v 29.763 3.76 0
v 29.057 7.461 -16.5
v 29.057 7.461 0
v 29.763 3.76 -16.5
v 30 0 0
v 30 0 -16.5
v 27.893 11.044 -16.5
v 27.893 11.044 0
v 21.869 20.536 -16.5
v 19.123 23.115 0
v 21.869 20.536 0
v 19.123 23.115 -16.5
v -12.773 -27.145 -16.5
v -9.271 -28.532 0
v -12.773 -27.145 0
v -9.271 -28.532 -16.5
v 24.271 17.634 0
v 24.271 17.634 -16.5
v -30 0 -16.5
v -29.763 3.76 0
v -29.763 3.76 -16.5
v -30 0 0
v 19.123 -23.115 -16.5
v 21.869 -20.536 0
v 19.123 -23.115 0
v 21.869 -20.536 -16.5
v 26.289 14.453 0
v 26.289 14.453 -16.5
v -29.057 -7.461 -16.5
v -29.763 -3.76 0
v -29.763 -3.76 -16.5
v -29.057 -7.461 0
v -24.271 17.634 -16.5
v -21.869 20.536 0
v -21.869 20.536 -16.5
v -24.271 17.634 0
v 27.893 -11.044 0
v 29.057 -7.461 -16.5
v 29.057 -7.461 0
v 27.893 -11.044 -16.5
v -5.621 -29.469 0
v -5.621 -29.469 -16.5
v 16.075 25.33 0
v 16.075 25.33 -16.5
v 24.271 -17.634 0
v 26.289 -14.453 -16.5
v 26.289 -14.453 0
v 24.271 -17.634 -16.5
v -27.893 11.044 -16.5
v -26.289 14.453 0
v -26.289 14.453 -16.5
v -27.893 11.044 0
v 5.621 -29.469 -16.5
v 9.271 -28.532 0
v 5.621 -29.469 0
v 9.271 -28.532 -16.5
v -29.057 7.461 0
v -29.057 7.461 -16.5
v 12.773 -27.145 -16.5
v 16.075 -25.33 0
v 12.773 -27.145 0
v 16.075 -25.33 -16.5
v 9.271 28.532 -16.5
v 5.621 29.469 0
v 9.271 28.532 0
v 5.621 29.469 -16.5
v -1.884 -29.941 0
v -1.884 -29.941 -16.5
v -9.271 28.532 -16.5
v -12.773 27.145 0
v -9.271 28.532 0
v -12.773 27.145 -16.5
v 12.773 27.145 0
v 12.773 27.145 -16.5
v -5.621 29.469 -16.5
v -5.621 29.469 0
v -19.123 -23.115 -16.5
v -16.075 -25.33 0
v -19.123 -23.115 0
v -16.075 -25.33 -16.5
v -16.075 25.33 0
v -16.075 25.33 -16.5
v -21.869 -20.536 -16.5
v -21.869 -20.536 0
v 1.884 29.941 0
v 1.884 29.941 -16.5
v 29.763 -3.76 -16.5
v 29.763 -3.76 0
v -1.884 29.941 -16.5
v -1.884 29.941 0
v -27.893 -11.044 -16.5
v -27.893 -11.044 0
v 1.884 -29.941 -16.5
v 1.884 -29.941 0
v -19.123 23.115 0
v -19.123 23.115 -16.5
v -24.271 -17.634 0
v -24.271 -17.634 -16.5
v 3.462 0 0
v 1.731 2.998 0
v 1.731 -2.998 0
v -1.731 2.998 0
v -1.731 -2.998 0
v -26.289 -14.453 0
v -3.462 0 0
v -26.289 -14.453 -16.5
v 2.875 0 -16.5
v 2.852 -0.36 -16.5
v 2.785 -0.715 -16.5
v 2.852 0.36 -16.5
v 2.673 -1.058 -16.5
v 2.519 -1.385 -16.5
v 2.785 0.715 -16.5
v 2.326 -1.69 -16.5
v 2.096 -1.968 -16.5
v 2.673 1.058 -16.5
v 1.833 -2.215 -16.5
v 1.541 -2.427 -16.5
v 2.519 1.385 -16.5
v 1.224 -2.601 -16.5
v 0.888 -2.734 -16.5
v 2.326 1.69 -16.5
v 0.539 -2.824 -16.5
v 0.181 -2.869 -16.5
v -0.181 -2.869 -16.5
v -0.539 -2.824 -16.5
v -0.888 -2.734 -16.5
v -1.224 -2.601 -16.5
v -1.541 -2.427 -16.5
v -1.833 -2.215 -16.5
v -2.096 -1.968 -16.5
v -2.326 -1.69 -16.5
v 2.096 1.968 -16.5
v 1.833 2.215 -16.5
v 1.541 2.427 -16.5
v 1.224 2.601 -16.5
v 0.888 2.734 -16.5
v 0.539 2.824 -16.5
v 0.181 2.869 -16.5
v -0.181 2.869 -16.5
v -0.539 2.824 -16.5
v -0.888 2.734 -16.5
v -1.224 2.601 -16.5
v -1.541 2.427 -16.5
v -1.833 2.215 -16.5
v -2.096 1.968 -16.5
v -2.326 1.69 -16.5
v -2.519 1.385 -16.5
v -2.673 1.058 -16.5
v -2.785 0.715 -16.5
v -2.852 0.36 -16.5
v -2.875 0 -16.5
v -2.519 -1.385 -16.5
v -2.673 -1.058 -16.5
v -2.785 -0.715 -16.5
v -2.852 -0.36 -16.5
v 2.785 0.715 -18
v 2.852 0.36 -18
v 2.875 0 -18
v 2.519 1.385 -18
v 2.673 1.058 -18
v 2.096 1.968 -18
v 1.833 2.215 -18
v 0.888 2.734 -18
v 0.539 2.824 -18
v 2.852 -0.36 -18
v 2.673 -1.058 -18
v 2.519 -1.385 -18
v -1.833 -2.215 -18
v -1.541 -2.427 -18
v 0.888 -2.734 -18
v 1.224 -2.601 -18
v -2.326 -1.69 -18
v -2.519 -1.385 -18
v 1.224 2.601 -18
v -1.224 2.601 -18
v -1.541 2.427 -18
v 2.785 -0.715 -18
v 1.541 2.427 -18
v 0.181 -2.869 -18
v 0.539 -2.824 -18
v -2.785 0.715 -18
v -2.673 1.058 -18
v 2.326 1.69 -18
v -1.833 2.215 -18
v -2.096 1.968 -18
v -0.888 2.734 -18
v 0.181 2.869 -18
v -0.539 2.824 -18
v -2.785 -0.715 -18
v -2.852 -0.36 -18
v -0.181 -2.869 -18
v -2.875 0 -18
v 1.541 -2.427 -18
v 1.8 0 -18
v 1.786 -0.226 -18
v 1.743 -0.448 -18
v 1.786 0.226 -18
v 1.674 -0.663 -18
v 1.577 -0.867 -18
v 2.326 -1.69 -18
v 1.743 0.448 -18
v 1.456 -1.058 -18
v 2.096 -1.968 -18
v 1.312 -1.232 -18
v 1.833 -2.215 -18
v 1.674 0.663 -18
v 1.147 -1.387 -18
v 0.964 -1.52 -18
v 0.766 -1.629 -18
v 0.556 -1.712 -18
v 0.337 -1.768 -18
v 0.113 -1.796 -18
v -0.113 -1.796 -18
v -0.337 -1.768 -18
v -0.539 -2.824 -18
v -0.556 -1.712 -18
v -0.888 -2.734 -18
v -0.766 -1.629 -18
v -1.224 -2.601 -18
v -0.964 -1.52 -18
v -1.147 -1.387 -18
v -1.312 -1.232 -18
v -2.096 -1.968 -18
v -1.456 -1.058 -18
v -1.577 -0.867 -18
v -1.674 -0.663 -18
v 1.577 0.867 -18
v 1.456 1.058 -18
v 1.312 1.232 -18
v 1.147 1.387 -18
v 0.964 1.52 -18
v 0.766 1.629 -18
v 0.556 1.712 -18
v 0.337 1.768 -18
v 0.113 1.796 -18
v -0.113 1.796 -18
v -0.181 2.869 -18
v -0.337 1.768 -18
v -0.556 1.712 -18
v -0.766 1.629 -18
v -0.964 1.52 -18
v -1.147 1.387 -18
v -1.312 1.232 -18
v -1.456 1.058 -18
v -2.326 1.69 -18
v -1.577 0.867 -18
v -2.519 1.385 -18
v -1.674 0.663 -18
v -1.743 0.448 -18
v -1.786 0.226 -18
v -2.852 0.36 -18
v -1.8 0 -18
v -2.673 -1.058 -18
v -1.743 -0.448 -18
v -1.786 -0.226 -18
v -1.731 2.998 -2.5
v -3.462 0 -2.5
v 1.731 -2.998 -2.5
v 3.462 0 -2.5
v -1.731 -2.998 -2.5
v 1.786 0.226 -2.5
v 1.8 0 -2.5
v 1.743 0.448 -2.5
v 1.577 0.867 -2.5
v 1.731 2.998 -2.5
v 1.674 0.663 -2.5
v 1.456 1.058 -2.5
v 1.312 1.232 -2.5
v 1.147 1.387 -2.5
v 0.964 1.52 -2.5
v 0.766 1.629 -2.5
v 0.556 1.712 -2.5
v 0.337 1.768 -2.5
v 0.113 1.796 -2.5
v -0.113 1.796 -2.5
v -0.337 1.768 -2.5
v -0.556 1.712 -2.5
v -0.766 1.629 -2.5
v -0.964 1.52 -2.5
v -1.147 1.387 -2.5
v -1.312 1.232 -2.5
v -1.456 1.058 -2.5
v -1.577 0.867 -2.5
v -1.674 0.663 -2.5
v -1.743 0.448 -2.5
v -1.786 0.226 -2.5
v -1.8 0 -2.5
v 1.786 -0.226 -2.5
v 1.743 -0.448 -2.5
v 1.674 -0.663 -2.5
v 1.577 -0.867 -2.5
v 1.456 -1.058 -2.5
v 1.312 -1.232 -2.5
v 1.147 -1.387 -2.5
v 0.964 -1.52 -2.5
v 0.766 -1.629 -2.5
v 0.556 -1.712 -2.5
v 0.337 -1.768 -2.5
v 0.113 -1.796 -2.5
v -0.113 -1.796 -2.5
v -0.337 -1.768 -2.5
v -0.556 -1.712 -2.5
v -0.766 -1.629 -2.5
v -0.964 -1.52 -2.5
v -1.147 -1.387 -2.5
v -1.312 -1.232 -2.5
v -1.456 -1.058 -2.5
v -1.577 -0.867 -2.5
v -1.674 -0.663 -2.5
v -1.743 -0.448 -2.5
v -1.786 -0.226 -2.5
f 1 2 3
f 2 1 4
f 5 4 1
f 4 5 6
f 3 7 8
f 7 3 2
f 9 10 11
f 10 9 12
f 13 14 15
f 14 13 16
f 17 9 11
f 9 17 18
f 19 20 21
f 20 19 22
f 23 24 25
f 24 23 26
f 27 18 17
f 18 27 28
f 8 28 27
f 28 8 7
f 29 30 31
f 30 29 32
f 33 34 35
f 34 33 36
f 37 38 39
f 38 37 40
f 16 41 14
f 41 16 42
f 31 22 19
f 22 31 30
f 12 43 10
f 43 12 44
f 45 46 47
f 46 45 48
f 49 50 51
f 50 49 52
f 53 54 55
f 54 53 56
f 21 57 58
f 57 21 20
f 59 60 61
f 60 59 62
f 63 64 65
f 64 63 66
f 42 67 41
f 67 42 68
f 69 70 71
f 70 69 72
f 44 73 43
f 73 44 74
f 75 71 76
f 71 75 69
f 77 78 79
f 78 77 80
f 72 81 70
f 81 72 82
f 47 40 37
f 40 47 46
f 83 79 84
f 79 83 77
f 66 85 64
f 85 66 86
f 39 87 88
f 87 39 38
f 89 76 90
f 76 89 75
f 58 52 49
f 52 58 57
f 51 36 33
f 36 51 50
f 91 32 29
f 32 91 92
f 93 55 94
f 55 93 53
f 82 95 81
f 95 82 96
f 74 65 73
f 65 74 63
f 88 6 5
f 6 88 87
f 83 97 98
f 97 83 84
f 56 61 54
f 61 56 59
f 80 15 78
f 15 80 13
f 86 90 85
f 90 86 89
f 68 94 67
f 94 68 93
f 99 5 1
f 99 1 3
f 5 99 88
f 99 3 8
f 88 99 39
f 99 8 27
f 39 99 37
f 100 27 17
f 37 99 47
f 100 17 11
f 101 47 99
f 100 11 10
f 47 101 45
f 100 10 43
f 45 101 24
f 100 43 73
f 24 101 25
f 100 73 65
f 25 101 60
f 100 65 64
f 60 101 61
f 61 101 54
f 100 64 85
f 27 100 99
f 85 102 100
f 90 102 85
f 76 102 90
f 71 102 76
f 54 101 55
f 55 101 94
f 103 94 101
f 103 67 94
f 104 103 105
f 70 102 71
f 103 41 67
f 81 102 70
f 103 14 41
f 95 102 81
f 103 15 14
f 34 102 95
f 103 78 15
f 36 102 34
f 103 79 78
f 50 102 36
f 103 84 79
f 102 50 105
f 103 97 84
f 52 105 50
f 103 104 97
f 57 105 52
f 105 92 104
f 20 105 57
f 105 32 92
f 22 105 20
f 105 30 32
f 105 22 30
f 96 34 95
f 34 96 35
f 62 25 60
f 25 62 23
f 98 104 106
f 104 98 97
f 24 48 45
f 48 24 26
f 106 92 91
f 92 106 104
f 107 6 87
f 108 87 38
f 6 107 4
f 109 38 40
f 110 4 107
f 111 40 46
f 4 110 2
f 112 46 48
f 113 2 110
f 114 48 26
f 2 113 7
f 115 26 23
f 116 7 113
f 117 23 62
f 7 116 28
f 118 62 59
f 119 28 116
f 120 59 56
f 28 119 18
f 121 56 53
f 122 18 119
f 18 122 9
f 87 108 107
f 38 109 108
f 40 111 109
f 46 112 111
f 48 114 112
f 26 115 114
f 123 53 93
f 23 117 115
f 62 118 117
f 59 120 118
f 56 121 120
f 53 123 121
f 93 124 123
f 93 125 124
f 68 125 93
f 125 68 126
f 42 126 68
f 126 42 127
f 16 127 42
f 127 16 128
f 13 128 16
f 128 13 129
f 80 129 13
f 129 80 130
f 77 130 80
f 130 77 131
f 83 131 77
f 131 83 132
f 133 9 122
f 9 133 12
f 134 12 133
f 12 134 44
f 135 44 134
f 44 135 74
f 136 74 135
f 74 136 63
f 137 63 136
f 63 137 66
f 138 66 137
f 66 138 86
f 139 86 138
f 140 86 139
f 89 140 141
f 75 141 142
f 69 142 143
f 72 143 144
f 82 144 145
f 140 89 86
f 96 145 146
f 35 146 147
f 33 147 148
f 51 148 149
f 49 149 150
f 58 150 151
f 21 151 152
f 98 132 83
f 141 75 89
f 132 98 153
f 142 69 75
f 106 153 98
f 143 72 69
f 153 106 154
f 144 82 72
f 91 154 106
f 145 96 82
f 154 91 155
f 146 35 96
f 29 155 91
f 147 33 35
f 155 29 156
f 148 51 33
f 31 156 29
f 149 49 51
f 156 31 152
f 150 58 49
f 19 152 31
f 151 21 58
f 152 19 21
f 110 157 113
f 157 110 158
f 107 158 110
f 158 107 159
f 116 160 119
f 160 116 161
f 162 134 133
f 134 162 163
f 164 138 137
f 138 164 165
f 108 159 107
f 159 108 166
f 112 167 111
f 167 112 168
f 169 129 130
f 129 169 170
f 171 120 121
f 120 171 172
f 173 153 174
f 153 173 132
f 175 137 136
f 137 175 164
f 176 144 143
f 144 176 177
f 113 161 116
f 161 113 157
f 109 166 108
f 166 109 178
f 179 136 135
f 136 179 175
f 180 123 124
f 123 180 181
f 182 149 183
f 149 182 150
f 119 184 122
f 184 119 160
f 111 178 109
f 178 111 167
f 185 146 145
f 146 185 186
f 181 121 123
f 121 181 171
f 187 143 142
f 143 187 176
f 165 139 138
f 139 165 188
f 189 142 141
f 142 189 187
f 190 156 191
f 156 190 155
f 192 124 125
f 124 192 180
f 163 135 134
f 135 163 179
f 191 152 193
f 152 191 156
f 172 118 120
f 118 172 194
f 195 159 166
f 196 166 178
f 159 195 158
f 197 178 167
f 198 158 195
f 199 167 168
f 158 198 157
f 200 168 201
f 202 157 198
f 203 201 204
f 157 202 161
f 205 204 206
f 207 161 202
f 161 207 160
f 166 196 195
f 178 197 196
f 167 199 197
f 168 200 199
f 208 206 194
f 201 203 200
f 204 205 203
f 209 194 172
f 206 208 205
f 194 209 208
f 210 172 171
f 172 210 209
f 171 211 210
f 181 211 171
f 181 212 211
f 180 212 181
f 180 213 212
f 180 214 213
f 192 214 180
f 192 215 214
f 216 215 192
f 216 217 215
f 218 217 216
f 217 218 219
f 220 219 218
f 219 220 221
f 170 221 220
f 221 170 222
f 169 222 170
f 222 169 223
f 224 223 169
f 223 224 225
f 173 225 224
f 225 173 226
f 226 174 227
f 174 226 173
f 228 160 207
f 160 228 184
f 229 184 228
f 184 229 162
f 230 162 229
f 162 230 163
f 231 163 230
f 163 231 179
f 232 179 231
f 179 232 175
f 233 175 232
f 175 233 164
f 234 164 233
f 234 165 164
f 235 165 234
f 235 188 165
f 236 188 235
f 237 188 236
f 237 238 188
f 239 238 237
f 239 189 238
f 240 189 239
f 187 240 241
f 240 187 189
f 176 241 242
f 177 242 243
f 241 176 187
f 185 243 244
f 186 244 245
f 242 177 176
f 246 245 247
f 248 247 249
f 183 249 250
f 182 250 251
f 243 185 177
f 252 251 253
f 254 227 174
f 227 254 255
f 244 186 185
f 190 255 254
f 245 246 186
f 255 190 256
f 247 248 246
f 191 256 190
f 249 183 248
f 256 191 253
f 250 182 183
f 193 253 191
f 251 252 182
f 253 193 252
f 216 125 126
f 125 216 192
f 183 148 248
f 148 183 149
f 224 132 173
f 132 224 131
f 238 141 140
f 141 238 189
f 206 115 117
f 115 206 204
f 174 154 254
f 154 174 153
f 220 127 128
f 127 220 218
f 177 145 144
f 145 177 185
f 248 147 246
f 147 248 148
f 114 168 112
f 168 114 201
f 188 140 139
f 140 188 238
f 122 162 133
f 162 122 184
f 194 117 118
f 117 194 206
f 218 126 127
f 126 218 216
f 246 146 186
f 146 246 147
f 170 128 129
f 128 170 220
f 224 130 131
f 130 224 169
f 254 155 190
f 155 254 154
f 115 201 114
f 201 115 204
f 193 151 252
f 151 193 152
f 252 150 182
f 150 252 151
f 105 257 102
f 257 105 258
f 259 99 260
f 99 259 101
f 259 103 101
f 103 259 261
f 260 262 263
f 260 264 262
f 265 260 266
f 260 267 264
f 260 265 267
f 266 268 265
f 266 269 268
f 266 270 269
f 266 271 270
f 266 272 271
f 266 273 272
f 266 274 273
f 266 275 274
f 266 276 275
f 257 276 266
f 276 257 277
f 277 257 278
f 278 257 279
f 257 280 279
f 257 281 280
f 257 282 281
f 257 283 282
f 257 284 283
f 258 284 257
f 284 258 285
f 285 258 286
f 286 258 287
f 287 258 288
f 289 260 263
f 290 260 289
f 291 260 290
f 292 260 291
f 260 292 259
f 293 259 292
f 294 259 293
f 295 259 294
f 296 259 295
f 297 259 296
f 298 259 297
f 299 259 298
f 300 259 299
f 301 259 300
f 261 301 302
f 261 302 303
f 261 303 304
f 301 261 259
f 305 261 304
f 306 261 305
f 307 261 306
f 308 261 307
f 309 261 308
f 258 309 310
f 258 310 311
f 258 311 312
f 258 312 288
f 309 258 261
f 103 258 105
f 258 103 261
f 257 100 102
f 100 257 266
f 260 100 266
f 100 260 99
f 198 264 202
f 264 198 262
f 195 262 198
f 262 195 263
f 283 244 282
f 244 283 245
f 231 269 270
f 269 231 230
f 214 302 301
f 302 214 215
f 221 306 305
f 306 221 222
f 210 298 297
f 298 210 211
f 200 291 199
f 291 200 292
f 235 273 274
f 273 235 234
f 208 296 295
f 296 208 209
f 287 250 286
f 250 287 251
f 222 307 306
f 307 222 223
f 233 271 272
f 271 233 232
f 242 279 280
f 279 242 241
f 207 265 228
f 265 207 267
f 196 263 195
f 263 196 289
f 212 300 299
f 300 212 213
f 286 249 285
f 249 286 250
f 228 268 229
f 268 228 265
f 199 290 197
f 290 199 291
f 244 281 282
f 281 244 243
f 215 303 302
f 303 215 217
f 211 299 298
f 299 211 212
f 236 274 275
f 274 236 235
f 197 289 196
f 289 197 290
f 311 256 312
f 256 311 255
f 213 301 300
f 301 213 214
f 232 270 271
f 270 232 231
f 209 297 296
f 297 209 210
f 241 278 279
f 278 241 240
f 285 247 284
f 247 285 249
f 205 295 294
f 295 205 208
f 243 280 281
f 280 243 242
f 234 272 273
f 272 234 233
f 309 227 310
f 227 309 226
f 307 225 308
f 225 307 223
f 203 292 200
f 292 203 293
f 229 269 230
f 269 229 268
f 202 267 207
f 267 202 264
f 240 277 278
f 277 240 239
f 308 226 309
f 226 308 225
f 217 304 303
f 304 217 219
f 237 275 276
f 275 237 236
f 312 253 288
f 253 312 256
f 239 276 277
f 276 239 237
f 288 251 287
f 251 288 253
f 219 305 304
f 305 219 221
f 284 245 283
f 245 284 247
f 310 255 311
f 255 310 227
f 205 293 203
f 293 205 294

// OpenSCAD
$fn = 50;


difference() {
	union() {
		translate(v = [0, 0, -16.5000000000]) {
			cylinder(h = 16.5000000000, r = 30.0000000000);
		}
		#translate(v = [0, 0, -18.0000000000]) {
			cylinder(h = 18, r = 2.8750000000);
		}
	}
	union() {
		translate(v = [0, 0, 0]) {
			rotate(a = [0, 0, 0]) {
				difference() {
					union() {
						translate(v = [0, 0, -2.5000000000]) {
							linear_extrude(height = 2.5000000000) {
								polygon(points = [[3.4620000000, 0.0000000000], [1.7310000000, 2.9981799479], [-1.7310000000, 2.9981799479], [-3.4620000000, 0.0000000000], [-1.7310000000, -2.9981799479], [1.7310000000, -2.9981799479]]);
							}
						}
					}
					union();
				}
			}
		}
		#translate(v = [0, 0, -100.0000000000]) {
			cylinder(h = 200, r = 1.8000000000);
		}
	}
}
